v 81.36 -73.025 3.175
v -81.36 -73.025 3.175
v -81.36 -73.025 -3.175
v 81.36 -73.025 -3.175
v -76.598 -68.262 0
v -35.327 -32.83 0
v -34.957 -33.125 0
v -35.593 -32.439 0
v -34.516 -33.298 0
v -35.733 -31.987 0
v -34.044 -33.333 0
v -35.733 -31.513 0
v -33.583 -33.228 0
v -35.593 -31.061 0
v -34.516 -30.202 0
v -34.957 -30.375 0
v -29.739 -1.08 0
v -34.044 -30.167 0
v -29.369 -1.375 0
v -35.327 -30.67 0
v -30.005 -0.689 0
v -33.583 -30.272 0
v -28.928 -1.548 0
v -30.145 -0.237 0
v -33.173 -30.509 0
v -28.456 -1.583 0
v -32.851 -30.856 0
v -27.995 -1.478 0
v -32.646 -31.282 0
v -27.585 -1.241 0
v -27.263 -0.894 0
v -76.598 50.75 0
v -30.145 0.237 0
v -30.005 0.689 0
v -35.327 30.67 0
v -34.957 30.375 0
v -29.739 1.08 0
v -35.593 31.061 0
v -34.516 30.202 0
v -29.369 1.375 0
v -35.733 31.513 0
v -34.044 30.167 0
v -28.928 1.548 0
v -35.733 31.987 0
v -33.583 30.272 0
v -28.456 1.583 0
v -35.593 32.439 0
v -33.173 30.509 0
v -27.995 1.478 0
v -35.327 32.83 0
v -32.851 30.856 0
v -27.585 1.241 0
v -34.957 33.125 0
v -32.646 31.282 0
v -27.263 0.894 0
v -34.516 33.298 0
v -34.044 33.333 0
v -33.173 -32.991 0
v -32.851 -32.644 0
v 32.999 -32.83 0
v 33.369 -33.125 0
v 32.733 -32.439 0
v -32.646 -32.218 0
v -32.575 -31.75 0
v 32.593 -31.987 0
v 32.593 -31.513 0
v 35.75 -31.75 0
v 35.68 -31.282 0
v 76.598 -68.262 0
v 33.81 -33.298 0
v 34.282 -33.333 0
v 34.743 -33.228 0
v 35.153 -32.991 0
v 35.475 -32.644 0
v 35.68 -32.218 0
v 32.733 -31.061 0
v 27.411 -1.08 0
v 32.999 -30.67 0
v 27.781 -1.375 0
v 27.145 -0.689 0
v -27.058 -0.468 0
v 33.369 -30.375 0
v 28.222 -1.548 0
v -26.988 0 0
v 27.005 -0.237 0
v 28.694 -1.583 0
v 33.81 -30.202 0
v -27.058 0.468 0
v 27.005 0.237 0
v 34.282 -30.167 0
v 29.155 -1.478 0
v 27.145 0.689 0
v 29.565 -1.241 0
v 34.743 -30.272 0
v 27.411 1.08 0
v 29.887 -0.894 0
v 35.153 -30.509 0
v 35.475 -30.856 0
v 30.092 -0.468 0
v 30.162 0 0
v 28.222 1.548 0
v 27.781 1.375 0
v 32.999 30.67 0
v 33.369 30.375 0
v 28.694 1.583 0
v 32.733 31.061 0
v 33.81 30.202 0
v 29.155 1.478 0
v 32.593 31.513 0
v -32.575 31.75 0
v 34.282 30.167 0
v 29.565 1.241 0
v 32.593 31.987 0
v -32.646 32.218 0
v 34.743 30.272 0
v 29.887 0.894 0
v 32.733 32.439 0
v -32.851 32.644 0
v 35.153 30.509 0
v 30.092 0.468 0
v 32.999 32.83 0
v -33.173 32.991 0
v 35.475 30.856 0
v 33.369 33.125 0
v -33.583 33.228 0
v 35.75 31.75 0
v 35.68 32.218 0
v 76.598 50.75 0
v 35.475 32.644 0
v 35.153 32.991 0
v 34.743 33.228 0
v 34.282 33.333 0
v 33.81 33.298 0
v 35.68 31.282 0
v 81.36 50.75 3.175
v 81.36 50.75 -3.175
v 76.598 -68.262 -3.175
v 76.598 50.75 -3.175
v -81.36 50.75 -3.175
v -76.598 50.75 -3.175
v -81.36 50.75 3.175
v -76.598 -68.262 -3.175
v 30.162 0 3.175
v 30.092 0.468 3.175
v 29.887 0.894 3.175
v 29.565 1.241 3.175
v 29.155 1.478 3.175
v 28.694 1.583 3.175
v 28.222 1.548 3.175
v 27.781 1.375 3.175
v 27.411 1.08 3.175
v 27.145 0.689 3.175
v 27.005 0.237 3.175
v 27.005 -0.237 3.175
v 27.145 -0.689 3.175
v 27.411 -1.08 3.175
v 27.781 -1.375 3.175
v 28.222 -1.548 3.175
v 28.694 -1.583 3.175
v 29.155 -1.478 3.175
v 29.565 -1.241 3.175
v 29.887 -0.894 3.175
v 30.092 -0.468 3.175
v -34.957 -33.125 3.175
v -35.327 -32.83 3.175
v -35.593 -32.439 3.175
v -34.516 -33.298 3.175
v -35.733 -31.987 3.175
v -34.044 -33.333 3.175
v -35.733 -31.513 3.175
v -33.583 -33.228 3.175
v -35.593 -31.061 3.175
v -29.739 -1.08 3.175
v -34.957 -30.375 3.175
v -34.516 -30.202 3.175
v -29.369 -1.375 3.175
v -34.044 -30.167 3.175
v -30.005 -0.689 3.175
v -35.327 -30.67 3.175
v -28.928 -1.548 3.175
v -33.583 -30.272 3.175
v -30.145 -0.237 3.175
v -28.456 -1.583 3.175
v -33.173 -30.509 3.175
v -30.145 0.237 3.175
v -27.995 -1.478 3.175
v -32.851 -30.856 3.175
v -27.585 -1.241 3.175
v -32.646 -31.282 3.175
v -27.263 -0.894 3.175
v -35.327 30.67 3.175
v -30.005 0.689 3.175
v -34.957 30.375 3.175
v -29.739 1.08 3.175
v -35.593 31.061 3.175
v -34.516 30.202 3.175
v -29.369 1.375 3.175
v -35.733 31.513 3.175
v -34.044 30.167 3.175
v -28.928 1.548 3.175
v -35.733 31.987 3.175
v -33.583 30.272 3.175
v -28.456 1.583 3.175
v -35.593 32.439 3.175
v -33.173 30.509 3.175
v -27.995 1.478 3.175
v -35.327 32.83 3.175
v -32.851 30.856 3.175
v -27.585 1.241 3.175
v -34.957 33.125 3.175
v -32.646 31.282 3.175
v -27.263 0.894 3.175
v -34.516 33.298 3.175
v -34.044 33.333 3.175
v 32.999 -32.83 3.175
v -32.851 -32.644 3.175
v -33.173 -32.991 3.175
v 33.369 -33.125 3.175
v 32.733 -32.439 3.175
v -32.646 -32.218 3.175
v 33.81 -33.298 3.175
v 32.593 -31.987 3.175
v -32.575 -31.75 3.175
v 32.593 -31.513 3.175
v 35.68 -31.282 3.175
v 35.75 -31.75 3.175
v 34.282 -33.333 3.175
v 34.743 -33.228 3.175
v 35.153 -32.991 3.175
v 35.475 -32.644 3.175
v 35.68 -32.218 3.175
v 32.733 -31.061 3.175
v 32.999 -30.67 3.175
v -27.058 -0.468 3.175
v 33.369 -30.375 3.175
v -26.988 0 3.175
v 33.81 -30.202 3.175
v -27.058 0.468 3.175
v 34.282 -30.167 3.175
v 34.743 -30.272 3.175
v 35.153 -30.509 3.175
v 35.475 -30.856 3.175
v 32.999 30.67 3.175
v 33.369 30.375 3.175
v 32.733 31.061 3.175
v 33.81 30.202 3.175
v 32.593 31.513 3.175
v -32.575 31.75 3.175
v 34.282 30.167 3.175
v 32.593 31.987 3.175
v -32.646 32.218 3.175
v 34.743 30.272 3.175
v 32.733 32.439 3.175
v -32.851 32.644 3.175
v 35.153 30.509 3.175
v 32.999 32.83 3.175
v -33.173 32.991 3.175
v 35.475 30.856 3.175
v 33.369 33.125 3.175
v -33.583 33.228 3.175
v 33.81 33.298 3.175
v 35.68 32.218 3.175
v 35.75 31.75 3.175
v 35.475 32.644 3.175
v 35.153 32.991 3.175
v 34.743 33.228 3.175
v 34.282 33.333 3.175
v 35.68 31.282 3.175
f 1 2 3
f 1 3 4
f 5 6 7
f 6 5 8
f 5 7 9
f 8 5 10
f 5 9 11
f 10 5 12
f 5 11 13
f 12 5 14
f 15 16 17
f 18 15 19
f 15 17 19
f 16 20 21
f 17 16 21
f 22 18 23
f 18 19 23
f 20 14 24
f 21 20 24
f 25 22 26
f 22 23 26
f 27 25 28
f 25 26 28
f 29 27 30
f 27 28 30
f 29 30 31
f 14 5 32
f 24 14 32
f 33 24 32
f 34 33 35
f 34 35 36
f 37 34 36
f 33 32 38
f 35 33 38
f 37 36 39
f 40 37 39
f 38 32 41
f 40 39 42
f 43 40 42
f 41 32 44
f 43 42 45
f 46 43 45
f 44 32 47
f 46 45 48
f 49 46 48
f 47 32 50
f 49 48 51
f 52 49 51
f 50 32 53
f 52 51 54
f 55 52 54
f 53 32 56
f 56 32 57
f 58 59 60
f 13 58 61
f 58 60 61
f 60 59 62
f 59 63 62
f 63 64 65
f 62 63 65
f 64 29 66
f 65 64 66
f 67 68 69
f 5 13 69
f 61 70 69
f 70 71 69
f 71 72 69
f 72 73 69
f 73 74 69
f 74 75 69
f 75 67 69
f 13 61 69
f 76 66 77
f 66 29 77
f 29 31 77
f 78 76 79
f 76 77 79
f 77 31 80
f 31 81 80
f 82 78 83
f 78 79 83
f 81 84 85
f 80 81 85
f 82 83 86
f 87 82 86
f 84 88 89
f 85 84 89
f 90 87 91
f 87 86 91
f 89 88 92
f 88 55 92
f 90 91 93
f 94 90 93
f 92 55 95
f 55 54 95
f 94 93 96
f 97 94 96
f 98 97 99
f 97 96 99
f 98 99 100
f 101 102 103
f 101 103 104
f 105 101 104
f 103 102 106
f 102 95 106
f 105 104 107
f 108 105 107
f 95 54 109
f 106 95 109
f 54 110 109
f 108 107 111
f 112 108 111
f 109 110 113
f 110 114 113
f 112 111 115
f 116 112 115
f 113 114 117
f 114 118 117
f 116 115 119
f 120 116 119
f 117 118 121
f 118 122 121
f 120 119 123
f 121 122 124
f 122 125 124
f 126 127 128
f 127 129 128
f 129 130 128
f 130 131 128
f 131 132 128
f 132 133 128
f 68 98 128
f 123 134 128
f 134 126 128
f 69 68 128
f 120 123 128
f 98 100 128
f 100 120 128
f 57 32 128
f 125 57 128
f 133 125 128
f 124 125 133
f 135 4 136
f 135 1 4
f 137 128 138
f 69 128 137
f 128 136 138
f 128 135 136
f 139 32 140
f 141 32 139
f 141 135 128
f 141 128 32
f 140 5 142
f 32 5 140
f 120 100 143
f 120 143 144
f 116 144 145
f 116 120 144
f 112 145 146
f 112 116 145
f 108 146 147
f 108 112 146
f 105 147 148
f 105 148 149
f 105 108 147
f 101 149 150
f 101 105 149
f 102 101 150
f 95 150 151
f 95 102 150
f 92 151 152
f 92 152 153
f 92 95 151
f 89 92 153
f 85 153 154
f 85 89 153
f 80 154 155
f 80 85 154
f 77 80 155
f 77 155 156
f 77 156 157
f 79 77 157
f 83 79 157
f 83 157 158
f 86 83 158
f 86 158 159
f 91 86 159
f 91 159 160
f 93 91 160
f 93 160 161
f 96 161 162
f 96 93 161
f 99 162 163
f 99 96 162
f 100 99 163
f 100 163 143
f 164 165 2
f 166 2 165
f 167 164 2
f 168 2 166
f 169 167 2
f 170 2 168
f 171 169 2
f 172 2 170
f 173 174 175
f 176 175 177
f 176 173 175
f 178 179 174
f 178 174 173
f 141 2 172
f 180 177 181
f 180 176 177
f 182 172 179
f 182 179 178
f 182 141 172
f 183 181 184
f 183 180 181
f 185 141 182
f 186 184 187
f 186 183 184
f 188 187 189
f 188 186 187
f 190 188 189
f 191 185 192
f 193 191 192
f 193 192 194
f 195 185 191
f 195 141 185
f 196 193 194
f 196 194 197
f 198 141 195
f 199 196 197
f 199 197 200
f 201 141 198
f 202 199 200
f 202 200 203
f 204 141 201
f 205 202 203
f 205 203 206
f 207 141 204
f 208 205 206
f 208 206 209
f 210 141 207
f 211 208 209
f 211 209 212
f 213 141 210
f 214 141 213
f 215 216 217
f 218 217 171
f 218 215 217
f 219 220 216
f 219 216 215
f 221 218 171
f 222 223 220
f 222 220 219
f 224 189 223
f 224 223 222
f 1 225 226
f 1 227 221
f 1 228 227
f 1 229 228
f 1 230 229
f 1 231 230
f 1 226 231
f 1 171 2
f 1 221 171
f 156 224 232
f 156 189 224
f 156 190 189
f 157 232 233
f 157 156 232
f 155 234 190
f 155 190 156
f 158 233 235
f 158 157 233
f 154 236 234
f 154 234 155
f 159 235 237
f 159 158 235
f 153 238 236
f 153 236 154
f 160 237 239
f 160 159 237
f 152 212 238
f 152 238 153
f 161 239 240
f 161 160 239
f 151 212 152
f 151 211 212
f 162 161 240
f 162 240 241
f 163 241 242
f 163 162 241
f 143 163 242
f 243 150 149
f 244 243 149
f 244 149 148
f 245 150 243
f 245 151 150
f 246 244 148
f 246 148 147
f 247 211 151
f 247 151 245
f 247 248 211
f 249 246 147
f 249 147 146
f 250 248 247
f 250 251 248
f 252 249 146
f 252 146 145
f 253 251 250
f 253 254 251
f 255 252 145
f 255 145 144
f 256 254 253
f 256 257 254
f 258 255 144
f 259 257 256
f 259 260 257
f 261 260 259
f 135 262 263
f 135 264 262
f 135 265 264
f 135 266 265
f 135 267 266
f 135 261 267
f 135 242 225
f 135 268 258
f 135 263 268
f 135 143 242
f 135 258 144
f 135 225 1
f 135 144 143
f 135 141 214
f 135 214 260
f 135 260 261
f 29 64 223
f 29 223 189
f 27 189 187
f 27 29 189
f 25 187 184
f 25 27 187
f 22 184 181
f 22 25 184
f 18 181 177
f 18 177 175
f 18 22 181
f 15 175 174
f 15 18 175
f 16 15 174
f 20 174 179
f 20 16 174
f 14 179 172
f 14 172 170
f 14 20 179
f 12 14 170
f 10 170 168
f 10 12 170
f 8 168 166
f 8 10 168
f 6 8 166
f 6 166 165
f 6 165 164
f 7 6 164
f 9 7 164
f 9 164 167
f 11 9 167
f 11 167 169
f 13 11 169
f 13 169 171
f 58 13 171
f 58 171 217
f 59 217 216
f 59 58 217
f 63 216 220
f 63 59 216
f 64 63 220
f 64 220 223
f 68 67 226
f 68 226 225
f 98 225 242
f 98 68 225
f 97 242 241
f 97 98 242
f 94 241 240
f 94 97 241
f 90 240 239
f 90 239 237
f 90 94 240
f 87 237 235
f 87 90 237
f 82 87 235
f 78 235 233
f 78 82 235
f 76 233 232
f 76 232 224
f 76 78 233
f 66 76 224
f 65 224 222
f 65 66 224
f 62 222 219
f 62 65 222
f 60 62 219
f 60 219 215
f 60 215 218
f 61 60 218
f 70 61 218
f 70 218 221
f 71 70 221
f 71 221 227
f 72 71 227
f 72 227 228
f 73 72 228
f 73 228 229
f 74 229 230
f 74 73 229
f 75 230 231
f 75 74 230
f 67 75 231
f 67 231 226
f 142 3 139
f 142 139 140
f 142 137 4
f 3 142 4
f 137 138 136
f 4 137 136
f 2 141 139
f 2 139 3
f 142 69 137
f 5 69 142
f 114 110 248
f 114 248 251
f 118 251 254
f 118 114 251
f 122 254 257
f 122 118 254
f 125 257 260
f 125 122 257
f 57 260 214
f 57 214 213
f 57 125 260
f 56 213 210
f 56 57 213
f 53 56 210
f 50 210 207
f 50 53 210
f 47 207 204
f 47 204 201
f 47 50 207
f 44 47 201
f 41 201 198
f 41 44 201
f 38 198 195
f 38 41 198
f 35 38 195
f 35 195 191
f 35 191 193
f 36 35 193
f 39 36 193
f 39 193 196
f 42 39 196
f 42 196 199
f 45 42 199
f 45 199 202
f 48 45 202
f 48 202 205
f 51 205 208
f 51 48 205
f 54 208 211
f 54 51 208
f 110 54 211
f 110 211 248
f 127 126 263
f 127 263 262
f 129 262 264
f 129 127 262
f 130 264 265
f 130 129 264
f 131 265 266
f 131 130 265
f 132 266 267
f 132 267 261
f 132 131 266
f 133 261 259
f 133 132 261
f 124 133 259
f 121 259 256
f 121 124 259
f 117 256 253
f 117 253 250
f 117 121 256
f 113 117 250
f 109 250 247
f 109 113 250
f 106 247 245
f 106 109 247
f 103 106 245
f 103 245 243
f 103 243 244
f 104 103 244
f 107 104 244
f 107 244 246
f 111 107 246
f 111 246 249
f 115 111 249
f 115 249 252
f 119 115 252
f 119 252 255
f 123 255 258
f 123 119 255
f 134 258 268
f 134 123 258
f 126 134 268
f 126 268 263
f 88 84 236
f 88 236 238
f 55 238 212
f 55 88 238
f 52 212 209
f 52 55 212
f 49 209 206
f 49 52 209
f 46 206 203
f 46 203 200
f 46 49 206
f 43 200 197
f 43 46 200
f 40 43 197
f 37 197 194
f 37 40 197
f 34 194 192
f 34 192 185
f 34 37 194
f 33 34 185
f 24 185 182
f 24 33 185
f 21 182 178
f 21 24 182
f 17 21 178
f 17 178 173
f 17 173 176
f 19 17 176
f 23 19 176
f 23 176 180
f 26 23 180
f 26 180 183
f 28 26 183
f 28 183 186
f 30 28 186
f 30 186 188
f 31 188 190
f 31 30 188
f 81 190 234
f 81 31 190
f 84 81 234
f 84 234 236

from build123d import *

# Parameters (mm, degrees)
F0_W     = 153.19502
F0_H     = 119.012598
F0_R     = 1.5875
F1_DEPTH = 3.175
F2_DEPTH = 3.175


with BuildPart() as f1:
    # F0 (on Top) → F1 (new body)
    with BuildSketch(Plane.XY):
        Polygon((76.59751, 50.750098), (76.59751, -68.2625), (-76.59751, -68.2625), (-76.59751, 50.750098), (-81.36001, 50.750098), (-81.36001, -73.025), (81.36001, -73.025), (81.36001, 50.750098), align=None)
        with Locations((0, -8.756201)):
            Rectangle(F0_W, F0_H)
        with Locations((-34.163, -31.75)):
            Circle(F0_R, mode=Mode.SUBTRACT)
        with Locations((34.163, -31.75)):
            Circle(F0_R, mode=Mode.SUBTRACT)
        with Locations((-28.575, 0)):
            Circle(F0_R, mode=Mode.SUBTRACT)
        with Locations((-34.163, 31.75)):
            Circle(F0_R, mode=Mode.SUBTRACT)
        with Locations((28.575, 0)):
            Circle(F0_R, mode=Mode.SUBTRACT)
        with Locations((34.163, 31.75)):
            Circle(F0_R, mode=Mode.SUBTRACT)
    extrude(amount=F1_DEPTH)

    # F0 (on Top) → F2 (join)
    with BuildSketch(Plane.XY):
        Polygon((76.59751, 50.750098), (76.59751, -68.2625), (-76.59751, -68.2625), (-76.59751, 50.750098), (-81.36001, 50.750098), (-81.36001, -73.025), (81.36001, -73.025), (81.36001, 50.750098), align=None)
    extrude(amount=-F2_DEPTH)


solid = f1.part
